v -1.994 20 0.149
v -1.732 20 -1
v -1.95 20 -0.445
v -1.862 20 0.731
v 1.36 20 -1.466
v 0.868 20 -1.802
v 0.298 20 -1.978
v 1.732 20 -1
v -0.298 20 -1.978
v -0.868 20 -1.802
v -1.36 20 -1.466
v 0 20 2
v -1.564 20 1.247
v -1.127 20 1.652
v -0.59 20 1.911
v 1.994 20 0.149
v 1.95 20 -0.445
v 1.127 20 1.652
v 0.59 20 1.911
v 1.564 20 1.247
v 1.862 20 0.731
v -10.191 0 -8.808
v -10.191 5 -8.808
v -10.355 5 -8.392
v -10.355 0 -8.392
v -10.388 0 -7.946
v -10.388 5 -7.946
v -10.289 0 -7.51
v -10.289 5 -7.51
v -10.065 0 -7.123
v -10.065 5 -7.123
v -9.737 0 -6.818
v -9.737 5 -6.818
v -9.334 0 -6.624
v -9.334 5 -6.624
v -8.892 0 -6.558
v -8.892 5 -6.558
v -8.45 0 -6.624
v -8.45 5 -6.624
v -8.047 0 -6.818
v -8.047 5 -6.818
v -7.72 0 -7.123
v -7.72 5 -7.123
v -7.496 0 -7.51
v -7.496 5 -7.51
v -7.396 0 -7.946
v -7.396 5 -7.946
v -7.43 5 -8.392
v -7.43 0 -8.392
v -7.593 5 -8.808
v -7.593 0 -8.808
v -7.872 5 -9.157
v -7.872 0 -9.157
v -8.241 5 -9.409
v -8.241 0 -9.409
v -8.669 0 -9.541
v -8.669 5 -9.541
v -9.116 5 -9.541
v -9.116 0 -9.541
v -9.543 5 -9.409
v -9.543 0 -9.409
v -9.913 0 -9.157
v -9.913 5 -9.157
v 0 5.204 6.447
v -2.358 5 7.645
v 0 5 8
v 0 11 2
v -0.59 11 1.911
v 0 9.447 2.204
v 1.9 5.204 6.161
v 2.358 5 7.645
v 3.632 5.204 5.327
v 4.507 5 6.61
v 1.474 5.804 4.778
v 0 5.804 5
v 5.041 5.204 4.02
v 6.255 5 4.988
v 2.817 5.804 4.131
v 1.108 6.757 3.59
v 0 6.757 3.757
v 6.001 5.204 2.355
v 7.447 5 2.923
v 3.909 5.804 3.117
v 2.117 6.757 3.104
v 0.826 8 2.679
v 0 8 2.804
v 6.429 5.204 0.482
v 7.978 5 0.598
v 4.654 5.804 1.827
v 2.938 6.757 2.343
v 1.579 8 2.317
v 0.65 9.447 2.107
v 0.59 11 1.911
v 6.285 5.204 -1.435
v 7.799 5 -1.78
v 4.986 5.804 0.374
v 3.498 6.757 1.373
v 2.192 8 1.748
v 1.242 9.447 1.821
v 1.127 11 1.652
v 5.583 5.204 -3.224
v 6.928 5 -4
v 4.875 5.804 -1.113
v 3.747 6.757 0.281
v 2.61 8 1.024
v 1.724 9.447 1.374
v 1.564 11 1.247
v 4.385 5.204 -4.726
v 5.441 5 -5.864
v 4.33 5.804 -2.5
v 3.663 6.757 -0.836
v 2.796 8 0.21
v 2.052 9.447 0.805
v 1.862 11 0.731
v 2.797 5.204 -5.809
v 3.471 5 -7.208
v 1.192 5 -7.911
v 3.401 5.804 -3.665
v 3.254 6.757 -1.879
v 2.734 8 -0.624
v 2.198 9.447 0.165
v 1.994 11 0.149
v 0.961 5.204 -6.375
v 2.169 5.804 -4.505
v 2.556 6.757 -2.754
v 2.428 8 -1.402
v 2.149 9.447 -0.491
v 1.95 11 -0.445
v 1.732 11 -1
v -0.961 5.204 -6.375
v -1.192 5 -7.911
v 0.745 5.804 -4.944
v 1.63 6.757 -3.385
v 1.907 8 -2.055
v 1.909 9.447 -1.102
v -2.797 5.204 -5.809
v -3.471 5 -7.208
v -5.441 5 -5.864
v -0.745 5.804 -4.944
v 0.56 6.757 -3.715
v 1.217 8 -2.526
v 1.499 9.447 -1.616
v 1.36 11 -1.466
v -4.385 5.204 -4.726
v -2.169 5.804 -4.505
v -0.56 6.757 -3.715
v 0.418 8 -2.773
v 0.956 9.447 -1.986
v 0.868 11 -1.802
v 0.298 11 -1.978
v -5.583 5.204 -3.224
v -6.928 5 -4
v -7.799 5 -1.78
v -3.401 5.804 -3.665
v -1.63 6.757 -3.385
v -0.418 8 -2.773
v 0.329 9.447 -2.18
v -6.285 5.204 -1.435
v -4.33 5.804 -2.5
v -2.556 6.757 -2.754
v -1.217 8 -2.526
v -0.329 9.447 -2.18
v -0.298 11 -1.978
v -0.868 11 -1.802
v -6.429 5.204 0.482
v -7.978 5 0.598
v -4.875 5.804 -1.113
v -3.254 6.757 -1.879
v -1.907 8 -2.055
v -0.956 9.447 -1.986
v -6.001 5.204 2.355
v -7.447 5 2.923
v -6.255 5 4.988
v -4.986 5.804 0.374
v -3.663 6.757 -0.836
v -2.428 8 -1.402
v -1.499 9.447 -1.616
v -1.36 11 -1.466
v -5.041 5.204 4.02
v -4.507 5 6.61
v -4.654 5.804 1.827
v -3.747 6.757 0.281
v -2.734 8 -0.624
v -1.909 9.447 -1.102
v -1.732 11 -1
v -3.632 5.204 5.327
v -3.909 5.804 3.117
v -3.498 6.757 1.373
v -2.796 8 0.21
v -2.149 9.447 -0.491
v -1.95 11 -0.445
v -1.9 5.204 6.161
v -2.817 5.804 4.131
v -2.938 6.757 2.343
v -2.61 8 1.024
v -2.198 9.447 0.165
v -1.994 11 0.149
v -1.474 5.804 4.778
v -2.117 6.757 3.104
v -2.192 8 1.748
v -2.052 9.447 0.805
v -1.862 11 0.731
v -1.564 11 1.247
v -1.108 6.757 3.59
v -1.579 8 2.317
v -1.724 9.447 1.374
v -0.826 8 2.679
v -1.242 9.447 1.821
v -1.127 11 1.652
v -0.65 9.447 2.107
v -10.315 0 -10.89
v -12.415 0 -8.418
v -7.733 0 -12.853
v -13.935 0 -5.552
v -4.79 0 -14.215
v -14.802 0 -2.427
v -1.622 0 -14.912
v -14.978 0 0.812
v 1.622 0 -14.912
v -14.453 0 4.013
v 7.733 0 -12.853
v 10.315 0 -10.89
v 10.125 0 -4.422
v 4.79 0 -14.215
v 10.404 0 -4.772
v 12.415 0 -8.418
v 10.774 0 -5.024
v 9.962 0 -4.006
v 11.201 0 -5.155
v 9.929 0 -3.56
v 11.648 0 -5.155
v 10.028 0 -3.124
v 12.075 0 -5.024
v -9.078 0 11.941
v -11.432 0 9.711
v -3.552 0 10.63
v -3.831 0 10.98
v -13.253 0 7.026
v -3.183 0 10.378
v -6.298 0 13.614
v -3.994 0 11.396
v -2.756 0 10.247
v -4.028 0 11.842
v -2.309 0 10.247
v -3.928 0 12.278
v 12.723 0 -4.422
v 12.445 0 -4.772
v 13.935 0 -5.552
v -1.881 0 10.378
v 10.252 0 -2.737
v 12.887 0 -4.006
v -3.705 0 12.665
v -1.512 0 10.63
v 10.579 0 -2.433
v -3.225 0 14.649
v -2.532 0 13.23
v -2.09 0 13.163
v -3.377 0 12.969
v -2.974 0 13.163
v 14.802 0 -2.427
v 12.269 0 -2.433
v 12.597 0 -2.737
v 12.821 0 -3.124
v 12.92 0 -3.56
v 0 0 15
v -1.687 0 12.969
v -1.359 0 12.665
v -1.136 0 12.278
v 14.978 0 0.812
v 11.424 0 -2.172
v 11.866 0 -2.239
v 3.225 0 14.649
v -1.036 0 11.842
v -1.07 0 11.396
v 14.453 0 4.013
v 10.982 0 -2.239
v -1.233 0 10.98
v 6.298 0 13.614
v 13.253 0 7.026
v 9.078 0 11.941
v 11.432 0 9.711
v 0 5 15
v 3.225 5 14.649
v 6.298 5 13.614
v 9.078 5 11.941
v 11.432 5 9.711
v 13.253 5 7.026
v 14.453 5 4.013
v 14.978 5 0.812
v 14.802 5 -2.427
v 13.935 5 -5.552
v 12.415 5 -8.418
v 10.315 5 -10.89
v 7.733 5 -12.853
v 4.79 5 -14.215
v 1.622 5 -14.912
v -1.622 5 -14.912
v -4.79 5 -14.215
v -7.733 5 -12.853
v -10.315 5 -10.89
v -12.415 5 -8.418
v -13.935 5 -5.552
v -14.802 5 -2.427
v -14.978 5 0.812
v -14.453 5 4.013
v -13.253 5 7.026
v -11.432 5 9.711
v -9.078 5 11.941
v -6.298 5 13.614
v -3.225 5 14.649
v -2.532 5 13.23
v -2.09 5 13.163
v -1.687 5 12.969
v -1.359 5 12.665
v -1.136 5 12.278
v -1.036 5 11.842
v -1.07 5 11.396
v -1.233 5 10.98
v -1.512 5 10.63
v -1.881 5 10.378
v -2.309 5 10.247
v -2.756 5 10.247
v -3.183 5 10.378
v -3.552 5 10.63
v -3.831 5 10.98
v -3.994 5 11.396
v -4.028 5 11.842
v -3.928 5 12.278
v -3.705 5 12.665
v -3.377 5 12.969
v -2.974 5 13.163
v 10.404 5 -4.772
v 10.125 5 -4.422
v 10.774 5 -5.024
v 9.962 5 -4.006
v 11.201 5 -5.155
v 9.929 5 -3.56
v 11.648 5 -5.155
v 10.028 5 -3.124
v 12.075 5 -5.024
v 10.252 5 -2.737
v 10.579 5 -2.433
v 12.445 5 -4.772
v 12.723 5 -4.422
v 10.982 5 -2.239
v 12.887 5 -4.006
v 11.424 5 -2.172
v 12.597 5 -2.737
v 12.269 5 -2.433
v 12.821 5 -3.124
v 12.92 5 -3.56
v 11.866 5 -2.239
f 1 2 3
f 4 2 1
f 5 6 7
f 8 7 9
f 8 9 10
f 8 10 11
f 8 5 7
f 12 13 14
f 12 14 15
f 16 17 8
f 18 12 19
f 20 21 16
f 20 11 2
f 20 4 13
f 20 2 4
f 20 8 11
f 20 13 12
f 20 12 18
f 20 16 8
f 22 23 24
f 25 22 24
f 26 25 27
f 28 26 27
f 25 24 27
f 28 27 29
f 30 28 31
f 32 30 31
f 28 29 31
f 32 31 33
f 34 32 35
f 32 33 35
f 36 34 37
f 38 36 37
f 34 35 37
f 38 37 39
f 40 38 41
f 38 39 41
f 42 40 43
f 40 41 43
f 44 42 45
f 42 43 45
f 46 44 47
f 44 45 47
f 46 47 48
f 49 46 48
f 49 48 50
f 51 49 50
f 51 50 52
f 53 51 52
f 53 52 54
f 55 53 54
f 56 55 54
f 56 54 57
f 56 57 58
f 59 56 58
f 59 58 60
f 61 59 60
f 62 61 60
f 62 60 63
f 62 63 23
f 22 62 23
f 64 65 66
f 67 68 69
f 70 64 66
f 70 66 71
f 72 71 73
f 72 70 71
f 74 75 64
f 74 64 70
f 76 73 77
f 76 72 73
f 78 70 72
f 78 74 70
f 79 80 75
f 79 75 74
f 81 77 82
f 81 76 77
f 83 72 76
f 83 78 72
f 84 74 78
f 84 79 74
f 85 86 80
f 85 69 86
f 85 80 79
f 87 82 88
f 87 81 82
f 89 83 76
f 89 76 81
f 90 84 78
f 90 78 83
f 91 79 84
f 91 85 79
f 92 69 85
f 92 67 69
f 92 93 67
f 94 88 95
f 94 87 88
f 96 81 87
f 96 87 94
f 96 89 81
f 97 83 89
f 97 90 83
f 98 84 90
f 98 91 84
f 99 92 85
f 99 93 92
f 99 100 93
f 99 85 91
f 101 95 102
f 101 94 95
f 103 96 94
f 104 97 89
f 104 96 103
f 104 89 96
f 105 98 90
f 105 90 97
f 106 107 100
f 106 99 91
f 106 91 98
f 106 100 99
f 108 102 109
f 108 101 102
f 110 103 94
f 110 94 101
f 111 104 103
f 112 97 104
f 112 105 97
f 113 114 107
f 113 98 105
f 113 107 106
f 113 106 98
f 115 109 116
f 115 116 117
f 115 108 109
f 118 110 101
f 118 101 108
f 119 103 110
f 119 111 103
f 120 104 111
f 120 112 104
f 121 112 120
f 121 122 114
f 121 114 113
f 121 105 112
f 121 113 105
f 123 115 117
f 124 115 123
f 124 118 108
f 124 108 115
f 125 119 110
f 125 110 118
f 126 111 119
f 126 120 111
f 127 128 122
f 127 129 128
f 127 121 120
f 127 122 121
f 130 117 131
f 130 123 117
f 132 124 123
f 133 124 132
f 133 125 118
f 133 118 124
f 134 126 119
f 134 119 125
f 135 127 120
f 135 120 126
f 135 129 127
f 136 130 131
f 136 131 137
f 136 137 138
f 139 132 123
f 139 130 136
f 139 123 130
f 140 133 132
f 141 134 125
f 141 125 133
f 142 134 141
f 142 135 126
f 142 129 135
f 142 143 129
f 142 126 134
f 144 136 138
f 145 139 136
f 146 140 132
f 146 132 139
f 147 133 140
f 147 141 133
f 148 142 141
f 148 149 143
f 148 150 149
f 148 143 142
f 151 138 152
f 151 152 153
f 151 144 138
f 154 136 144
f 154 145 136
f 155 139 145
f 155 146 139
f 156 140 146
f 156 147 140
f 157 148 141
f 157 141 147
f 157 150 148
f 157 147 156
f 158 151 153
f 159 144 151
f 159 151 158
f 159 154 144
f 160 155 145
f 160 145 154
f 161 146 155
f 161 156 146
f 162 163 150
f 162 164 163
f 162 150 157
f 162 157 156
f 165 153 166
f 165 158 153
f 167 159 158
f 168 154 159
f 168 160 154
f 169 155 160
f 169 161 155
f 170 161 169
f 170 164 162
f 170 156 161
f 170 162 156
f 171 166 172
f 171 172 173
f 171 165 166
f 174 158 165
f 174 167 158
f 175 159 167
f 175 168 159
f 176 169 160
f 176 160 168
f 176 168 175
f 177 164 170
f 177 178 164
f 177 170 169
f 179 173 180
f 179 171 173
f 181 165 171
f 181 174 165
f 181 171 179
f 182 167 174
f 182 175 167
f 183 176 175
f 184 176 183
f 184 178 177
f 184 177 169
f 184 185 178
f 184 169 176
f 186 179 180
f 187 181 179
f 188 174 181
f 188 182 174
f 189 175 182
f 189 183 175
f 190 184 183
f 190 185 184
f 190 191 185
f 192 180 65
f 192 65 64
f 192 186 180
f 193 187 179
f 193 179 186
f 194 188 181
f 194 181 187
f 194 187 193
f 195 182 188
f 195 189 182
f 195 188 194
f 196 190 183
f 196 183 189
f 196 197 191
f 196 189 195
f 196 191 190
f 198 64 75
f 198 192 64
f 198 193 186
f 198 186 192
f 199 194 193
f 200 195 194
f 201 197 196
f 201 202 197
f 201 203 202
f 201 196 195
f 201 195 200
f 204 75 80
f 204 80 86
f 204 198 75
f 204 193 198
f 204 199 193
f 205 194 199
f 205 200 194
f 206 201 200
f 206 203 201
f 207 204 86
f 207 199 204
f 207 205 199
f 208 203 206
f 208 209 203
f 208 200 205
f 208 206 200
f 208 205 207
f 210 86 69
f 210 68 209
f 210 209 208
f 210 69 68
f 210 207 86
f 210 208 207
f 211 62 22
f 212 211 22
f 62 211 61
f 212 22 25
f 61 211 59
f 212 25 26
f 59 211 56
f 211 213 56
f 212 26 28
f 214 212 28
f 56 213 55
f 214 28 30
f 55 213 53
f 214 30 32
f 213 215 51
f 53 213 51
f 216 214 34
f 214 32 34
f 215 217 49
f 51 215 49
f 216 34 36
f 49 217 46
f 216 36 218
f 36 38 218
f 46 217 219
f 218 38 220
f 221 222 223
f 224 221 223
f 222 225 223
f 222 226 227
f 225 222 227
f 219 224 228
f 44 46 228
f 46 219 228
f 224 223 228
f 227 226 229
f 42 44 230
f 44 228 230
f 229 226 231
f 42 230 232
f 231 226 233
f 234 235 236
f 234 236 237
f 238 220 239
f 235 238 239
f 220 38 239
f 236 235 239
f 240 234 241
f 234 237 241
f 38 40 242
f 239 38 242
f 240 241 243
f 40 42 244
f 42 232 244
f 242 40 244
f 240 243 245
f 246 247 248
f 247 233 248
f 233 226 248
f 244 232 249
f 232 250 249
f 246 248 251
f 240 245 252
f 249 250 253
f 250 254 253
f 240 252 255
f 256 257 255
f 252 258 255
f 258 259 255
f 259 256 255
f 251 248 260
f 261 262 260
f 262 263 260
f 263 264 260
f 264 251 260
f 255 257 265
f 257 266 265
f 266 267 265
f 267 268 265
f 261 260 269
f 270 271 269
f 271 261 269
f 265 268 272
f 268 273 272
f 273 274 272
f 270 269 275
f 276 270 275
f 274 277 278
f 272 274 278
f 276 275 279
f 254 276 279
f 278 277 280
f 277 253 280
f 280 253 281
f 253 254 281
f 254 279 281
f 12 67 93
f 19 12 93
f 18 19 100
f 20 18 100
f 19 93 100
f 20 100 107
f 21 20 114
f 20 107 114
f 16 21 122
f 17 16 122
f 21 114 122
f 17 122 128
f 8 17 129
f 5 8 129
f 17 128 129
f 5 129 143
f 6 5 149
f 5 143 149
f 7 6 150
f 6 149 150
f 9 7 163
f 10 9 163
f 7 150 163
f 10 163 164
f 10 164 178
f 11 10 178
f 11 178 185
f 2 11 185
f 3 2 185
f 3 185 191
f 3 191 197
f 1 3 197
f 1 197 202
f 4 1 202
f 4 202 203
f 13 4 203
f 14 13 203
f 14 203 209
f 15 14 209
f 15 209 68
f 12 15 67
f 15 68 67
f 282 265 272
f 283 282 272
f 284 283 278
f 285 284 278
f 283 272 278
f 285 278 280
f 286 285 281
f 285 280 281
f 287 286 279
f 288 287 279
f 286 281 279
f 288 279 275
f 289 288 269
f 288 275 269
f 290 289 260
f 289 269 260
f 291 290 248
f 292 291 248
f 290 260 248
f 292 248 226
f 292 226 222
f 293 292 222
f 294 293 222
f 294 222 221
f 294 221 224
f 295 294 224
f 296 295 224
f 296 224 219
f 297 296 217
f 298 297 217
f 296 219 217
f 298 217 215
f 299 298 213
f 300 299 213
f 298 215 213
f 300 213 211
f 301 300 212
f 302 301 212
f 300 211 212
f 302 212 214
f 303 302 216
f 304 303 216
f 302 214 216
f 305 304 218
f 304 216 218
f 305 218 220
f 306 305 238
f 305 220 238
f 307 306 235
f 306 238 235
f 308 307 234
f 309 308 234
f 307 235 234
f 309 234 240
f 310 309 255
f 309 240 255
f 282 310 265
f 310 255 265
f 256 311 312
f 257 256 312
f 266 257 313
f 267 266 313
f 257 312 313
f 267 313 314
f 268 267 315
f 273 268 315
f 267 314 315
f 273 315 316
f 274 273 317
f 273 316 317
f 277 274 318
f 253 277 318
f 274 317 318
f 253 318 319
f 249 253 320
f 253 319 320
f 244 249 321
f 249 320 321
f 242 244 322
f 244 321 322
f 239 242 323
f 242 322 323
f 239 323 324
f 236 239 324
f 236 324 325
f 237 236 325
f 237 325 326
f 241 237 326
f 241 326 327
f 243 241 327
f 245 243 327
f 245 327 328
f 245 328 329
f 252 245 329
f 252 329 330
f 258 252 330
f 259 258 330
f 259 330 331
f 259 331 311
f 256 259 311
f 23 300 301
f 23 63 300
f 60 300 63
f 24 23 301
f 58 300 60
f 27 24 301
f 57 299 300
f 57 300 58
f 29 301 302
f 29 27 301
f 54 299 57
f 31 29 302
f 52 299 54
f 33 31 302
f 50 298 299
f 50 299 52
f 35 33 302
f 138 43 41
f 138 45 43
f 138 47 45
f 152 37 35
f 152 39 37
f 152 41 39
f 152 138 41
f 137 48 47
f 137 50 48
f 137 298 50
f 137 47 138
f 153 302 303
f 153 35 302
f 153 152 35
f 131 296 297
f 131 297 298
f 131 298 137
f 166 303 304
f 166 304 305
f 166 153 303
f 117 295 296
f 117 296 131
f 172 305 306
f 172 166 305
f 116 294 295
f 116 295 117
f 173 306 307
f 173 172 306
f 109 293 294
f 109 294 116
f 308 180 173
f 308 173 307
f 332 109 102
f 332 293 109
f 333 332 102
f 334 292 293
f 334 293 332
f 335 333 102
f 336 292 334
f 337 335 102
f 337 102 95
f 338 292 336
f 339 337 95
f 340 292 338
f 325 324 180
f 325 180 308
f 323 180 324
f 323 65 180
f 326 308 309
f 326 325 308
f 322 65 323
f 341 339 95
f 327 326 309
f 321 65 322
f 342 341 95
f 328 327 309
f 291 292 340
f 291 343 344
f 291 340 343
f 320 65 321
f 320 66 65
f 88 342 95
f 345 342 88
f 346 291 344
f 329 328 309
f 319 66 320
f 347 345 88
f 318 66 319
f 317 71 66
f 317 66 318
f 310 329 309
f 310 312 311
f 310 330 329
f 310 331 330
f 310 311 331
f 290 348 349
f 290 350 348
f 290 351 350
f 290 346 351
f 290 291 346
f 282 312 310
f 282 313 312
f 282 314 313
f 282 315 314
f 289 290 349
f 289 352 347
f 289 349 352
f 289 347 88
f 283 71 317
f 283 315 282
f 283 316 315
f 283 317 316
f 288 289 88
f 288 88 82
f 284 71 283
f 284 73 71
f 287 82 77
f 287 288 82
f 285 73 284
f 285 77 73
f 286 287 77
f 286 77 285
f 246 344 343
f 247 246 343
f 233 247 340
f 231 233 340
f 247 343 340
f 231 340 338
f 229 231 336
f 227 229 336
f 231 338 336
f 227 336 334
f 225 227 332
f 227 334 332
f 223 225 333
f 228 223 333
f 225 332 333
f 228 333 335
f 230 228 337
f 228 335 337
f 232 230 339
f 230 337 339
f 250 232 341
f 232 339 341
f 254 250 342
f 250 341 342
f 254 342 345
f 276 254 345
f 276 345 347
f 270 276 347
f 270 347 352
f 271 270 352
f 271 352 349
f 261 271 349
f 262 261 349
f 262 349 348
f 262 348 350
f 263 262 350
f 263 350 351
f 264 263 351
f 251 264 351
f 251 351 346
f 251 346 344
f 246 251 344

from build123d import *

# Parameters (mm, degrees)
SKETCH1_R           = 15
BOSS_EXTRUDE1_DEPTH = 5
SKETCH2_R           = 2
BOSS_EXTRUDE2_DEPTH = 15
FILLET1_R           = 6
SKETCH3_R           = 1.5
CUT_EXTRUDE1_DEPTH  = 26.980762114
CIRPATTERN1_COUNT   = 3


with BuildPart() as part:
    # Sketch1 → Boss-Extrude1 (new body)
    with BuildSketch(Plane(origin=(0, 0, 0), x_dir=(1, 0, 0), z_dir=(0, 1, 0))):
        Circle(SKETCH1_R)
    extrude(amount=BOSS_EXTRUDE1_DEPTH)

    # Sketch2 → Boss-Extrude2 (add)
    with BuildSketch(Plane(origin=(0, 5, 0), x_dir=(1, 0, 0), z_dir=(0, 1, 0))):
        Circle(SKETCH2_R)
    extrude(amount=BOSS_EXTRUDE2_DEPTH)

    # Fillet1
    fillet1_edges = [part.edges().sort_by_distance(p)[0] for p in [
        (-2, 5, 0),
    ]]
    fillet(fillet1_edges, radius=FILLET1_R)

    # Sketch3 → Cut-Extrude1 (cut, through all)
    with BuildSketch(Plane(origin=(0, 5, 0), x_dir=(1, 0, 0), z_dir=(0, 1, 0))):
        with Locations((-2.532093929, -11.72981246)):
            Circle(SKETCH3_R)
    cut_extrude1 = extrude(amount=-CUT_EXTRUDE1_DEPTH, mode=Mode.SUBTRACT)

    # CirPattern1: Cut-Extrude1 ×3 about axis
    cirpattern1_axis = Axis((0, 20, 0), (0, -1, 0))
    for i in range(1, CIRPATTERN1_COUNT):
        add(cut_extrude1.rotate(cirpattern1_axis, i * 360 / CIRPATTERN1_COUNT), mode=Mode.SUBTRACT)


solid = part.part
